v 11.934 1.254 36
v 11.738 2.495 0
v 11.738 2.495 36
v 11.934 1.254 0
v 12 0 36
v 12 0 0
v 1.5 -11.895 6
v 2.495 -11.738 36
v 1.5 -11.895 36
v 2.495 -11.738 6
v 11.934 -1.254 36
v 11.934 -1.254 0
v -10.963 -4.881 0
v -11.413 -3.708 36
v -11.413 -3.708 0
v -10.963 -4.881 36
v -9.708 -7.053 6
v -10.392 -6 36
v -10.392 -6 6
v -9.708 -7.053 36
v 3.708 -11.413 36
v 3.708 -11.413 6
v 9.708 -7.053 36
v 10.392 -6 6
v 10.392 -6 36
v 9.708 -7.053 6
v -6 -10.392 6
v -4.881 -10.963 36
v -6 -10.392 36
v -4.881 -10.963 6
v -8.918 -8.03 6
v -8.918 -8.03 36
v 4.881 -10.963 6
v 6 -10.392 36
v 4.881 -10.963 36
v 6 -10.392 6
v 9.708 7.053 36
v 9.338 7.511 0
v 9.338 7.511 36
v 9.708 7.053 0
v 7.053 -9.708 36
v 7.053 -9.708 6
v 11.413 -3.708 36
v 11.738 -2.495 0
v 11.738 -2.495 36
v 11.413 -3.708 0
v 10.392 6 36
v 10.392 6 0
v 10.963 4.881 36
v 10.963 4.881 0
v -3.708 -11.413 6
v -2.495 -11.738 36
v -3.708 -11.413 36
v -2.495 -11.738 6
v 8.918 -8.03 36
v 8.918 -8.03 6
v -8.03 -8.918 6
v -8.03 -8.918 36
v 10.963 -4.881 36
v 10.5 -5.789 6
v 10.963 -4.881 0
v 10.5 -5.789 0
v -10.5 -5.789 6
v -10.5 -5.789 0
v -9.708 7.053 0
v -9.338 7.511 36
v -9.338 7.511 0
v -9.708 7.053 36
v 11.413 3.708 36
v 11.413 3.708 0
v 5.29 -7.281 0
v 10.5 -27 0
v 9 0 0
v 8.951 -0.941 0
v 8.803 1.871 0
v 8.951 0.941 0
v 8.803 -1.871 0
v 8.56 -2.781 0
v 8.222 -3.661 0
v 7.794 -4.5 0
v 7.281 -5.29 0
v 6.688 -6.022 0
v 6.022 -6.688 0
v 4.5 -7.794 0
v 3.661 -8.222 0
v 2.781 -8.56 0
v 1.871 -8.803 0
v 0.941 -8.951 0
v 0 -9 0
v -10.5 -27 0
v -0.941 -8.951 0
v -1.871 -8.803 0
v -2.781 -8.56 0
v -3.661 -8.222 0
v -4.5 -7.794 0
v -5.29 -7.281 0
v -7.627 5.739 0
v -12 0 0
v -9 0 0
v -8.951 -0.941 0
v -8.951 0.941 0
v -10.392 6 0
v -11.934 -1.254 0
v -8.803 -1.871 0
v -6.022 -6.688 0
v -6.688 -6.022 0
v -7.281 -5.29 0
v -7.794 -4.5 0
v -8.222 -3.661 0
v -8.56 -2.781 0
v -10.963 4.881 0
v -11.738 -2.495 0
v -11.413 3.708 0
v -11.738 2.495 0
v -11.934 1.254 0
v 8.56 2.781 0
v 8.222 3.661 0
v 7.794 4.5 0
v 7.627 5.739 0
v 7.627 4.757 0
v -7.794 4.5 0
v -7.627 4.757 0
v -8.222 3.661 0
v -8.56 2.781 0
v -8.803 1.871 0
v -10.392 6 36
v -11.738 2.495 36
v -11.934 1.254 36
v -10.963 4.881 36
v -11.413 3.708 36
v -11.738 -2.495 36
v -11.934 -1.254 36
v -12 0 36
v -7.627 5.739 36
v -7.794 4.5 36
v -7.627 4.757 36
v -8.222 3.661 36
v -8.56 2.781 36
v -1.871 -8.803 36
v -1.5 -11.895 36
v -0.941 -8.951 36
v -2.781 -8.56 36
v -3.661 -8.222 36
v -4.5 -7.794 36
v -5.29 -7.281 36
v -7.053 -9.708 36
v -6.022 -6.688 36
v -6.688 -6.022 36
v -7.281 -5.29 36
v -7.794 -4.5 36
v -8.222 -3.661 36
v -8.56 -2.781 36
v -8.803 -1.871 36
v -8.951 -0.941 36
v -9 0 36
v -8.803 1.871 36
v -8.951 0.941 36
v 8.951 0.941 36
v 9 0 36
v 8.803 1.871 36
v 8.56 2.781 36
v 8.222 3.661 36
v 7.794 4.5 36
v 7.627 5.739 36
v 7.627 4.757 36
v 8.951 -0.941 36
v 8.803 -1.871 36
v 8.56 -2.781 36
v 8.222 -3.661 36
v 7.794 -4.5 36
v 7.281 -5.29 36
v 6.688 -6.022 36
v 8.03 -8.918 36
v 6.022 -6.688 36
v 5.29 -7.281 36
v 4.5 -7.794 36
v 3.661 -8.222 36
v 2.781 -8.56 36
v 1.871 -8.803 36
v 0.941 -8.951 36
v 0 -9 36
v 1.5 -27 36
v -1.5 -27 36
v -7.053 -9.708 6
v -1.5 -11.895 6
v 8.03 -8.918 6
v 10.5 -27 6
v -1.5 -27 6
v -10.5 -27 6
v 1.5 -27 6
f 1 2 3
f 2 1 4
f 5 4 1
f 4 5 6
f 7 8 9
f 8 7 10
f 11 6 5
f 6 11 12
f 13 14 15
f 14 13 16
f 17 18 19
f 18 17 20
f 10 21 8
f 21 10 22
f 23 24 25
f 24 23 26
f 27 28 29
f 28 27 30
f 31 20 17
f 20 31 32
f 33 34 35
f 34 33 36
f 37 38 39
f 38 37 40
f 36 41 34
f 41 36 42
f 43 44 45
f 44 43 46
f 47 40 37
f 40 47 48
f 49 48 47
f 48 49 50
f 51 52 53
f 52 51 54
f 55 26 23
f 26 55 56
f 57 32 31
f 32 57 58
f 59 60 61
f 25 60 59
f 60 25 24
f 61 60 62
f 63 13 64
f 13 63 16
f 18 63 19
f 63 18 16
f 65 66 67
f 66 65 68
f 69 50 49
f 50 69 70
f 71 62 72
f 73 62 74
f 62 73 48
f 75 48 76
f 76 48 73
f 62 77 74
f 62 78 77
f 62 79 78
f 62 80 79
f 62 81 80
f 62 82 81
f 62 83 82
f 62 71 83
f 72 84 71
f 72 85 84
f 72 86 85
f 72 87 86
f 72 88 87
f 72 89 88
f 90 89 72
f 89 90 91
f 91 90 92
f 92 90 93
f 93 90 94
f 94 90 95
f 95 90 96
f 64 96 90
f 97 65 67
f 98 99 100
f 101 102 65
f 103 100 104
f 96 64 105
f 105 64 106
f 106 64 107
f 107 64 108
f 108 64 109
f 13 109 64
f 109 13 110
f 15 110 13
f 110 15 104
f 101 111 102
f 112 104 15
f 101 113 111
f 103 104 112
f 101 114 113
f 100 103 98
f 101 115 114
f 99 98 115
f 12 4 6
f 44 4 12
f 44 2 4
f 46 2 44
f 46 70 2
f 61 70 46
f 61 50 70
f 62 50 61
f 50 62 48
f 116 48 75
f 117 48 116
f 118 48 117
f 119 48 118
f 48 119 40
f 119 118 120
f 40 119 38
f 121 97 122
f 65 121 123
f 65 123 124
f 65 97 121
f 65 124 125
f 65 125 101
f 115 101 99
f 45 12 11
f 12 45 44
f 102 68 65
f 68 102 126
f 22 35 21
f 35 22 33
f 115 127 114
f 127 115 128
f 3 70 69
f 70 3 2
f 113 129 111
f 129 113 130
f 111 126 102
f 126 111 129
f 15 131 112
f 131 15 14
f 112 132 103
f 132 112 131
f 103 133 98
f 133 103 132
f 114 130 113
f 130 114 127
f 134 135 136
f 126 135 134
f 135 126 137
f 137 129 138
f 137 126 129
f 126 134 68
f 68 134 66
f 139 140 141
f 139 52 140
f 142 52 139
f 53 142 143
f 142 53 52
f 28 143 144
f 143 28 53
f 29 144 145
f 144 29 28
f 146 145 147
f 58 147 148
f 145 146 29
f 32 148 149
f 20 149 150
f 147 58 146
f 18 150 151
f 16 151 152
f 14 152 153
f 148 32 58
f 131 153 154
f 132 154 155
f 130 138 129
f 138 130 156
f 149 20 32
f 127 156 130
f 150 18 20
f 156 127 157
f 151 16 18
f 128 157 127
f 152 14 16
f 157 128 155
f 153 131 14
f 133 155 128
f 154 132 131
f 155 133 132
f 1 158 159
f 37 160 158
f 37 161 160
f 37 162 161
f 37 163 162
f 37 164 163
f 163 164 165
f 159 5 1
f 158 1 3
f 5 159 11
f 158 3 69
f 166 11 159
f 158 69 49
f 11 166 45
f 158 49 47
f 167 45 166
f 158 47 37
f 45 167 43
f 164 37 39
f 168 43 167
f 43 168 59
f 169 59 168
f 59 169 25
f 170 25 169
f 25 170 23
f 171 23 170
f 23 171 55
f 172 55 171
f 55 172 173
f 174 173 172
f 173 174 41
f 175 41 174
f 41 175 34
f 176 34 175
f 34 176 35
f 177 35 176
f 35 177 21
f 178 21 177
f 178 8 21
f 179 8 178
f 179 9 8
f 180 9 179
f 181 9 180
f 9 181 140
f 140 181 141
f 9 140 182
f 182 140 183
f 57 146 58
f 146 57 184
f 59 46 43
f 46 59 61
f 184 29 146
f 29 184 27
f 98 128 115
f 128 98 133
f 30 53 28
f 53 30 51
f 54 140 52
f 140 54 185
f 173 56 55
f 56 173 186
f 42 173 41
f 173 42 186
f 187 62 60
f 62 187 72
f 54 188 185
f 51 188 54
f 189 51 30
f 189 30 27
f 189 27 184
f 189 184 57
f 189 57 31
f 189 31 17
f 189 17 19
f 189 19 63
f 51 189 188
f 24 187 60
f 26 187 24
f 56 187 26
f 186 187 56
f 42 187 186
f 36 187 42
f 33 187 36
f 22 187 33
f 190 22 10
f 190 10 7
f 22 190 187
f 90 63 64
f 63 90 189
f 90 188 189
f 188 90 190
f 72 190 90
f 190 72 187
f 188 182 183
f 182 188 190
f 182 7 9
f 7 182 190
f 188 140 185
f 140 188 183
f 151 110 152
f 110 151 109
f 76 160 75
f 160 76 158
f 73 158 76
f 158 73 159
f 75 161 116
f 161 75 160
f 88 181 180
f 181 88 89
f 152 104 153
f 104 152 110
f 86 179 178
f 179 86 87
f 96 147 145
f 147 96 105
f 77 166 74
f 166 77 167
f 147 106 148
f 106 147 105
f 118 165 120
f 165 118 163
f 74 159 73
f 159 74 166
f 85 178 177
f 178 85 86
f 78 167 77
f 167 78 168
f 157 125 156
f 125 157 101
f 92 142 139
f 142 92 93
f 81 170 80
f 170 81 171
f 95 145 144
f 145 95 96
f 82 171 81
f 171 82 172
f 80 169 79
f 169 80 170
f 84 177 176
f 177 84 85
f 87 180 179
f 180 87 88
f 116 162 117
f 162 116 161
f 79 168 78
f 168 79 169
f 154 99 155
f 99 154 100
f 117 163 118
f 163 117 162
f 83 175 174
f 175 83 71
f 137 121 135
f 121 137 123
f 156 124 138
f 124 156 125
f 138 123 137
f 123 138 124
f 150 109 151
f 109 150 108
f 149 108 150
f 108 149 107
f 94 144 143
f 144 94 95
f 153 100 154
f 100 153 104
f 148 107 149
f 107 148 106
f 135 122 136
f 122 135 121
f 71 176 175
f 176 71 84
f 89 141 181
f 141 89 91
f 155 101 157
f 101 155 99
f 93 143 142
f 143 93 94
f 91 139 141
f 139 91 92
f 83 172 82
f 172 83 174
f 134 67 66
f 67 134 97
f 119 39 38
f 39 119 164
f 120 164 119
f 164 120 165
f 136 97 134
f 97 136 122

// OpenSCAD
// preview[view:north east, tilt:top diagonal]

// Diameter of tube
d = 18; // [3:0.1:100]

// Length of mount
h = 36; // [3:100]

// Do you want vertical mount?
Vmount = 1; // [1:Yes,0:No]

// Do you want horizontal mount?
Hmount = 1; // [1:Yes,0:No]

/* [Hidden] */
r = d/2;
f = d/7;
t = d/6;
a = 44;
detail = 60;

// Difference will construct a main shape and subtract cut outs
difference() {
    
  //***********
  // Main Shape
  //***********
    
  union(){    
      
    // Main cylinder solid
    translate([0,0,h/2]) {
      cylinder(h, r+t,r+t,true,$fn=detail);
    }
       
   // Horizontal mounting plate  
   if (Hmount == 1) {
   rotate([0,0,0]) {
     translate([-r-t/2,-d*1.5,0]) {
       cube([d+t, d*1.5, t*2], false);
     }
   }
   }
   
   // Vertical mounting plate
   if (Vmount == 1) {
   rotate([0,90,0]) {
     translate([-h,-d*1.5,-t/2]) {
       cube([h, d, t], false);
     }
   }
   }

  } // End union


  //**********  
  // Cut outs
  //**********
  
  // Cut out center cylinder
  translate([0,0,-1]) {
    cylinder(h+2, r, r, false, $fn=detail);
    }
  
     // Cut out right wall
    rotate([0,0,a]) {
      translate([0,r,h/2]) {
        cube([t, d, h+2],true);   
      }
    }

   // Cut out left wall
   rotate([0,0,-a]) {
      translate([0,r,h/2]) {
        cube([t, d, h+2],true);   
      }
    }

    // Cut out center wall
    translate([0,r,h/2]) {
        cube([d/1.18, d, h+2],true);   
      }
    
  } // End difference
  
